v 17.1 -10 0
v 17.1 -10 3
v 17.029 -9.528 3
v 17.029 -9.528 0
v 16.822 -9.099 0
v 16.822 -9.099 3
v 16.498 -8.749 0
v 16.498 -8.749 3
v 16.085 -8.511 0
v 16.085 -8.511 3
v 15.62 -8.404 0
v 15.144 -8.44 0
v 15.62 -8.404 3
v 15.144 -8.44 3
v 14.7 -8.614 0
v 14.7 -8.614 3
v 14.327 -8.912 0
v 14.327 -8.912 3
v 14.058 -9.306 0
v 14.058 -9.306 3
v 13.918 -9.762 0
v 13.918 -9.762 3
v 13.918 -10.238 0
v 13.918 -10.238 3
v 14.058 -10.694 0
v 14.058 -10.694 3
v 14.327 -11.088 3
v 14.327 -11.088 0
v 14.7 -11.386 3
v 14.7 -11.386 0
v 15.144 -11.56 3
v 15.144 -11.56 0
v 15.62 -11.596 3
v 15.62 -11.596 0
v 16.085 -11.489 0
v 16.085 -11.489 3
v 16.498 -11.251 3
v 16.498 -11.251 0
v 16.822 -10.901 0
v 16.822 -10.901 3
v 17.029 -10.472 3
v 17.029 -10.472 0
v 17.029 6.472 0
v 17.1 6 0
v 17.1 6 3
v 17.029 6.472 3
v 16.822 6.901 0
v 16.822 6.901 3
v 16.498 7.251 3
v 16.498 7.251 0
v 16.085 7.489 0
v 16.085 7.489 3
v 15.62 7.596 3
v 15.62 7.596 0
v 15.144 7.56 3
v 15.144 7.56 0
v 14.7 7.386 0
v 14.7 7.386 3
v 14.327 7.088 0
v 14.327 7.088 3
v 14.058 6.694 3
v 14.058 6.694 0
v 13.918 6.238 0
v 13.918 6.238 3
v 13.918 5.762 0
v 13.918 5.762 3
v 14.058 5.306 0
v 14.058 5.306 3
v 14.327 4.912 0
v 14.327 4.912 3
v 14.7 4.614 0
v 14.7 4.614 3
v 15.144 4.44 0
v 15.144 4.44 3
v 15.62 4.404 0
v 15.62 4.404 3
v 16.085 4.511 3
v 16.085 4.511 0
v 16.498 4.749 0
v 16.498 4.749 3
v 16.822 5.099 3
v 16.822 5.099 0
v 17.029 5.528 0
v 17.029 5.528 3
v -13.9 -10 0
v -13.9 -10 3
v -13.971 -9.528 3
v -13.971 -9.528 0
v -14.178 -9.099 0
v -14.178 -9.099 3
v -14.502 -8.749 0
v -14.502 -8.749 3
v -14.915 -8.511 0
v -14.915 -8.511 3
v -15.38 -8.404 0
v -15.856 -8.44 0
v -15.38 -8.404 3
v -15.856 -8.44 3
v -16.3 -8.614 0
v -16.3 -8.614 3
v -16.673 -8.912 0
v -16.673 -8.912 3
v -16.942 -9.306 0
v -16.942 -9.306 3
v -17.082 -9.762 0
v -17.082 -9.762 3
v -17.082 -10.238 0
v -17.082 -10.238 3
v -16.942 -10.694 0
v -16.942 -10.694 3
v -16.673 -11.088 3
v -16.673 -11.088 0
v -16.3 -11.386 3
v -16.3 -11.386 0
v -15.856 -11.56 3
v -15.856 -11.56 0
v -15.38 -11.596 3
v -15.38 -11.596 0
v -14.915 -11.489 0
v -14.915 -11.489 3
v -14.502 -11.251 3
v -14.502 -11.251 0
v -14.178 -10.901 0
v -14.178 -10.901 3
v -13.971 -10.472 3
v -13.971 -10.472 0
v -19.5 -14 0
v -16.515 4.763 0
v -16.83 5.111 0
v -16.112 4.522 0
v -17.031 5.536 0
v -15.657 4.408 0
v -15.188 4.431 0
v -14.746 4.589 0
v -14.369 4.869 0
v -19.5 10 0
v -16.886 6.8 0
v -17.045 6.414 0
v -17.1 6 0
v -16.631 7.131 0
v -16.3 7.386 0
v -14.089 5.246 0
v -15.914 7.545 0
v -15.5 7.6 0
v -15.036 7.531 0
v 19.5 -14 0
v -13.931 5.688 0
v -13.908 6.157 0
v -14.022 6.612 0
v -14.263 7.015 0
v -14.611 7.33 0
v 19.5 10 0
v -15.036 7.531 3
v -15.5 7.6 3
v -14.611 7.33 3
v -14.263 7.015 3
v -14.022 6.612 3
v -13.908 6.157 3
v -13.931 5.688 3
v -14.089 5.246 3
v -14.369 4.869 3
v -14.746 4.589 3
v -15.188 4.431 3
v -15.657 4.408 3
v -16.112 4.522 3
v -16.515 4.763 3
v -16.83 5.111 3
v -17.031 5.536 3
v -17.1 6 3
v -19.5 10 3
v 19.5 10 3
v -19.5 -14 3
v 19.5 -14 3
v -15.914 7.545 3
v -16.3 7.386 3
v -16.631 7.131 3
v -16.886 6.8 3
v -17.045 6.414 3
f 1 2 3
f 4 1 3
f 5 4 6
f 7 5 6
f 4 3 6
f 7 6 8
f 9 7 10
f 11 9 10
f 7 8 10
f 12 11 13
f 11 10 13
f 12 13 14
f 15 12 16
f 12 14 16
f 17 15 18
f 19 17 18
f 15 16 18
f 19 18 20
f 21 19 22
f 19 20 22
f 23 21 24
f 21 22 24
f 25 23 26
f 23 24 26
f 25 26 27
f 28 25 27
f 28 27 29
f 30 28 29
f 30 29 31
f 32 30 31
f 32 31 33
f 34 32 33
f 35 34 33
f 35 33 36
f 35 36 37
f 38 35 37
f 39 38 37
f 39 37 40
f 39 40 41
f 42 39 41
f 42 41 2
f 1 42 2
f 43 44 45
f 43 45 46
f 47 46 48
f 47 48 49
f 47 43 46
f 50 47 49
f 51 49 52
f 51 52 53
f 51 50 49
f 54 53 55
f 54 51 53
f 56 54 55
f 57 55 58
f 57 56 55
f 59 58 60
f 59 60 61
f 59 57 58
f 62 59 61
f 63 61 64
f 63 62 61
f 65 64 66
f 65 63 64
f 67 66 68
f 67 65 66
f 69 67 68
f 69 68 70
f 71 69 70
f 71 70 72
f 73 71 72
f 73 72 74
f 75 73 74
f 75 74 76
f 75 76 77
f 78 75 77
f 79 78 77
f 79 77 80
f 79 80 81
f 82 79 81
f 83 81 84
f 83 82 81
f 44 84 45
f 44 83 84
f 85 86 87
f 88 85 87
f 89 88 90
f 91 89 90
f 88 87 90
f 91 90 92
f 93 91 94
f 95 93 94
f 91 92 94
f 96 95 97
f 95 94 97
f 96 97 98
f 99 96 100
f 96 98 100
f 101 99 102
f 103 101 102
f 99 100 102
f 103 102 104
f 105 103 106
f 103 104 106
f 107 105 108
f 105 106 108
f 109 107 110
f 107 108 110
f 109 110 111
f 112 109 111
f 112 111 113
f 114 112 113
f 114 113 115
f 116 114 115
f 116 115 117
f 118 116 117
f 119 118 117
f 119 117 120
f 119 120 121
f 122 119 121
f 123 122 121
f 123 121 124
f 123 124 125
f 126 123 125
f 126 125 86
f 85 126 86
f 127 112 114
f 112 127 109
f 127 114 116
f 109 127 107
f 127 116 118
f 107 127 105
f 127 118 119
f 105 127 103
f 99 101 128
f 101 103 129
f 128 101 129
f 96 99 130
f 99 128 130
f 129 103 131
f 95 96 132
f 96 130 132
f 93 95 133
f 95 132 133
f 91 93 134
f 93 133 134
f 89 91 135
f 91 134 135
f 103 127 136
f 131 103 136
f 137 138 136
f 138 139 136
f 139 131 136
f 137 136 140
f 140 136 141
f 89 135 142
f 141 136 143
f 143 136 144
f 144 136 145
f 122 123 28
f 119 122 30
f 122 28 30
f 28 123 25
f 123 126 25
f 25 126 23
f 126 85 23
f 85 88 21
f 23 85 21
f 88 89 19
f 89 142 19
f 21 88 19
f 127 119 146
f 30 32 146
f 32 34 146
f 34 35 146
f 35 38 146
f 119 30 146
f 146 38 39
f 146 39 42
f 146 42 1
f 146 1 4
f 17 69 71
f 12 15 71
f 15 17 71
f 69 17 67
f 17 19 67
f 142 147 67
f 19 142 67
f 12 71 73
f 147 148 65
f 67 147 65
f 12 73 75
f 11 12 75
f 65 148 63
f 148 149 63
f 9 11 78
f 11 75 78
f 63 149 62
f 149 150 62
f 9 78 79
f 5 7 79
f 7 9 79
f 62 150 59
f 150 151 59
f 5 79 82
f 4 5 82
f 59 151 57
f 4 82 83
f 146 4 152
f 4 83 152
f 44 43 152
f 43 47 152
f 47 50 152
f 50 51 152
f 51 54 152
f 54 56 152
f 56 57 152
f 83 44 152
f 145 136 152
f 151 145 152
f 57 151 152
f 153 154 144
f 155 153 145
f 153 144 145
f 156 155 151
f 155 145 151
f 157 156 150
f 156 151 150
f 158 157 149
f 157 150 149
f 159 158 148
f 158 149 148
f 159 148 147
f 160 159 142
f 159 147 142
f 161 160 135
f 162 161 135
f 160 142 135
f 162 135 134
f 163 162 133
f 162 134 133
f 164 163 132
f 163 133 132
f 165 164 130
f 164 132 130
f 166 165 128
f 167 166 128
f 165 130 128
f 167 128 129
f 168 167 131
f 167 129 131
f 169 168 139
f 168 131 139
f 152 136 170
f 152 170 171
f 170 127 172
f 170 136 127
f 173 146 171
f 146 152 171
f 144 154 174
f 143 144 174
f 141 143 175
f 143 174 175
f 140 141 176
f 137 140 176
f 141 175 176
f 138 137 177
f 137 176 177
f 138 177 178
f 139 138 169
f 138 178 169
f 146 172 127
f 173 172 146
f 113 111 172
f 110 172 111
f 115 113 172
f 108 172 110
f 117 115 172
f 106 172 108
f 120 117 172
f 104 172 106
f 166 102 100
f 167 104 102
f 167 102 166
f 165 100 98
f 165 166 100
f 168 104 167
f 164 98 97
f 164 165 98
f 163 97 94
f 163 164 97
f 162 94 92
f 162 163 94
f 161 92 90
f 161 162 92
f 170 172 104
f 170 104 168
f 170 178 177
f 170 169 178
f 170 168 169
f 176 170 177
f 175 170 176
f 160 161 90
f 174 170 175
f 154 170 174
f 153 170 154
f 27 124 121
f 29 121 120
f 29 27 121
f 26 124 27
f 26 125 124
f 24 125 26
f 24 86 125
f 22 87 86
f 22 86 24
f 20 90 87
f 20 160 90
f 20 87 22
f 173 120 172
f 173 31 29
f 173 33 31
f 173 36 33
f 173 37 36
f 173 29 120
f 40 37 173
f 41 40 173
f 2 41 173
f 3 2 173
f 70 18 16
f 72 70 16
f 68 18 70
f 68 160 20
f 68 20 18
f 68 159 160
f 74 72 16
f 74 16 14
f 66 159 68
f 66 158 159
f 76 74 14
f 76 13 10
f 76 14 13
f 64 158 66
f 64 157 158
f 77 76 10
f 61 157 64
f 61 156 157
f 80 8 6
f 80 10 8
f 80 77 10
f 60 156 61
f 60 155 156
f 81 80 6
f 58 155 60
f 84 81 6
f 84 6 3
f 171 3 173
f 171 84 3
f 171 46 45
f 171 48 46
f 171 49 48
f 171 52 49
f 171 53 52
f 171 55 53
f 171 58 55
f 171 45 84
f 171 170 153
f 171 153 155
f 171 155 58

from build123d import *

# Parameters (mm, degrees)
SKETCH_1_W          = 39
SKETCH_1_H          = 20
SKETCH_1_R          = 1.6
EXTRUDE_1_DEPTH     = 3
SKETCH_2_W          = 39
SKETCH_2_H          = 3
EXTRUDE_2_DEPTH     = 4
SKETCH_3_R          = 1.6
CUT_EXTRUDE_1_DEPTH = 4


with BuildPart() as part:
    # ｽｹｯﾁ1 → ﾎﾞｽ - 押し出し1 (new body)
    with BuildSketch(Plane.XY):
        Rectangle(SKETCH_1_W, SKETCH_1_H)
        with Locations((15.5, 6)):
            Circle(SKETCH_1_R, mode=Mode.SUBTRACT)
        with BuildLine():
            ThreePointArc((-15.5, 7.6), (-14.36862915, 4.86862915), (-17.1, 6))
            Line((-17.1, 6), (-15.5, 6))
            Line((-15.5, 6), (-15.5, 7.6))
        make_face(mode=Mode.SUBTRACT)
    extrude(amount=EXTRUDE_1_DEPTH)

    # ｽｹｯﾁ2 → ﾎﾞｽ - 押し出し2 (add)
    with BuildSketch(Plane.XZ.offset(10)):
        with Locations((0, 1.5)):
            Rectangle(SKETCH_2_W, SKETCH_2_H)
    extrude(amount=EXTRUDE_2_DEPTH)

    # ｽｹｯﾁ3 → ｶｯﾄ - 押し出し1 (cut)
    with BuildSketch(Plane.XY.offset(3)):
        with Locations((-15.5, 6)):
            Circle(SKETCH_3_R)
        with Locations((-15.5, -10)):
            Circle(SKETCH_3_R)
        with Locations((15.5, -10)):
            Circle(SKETCH_3_R)
    extrude(amount=-CUT_EXTRUDE_1_DEPTH, mode=Mode.SUBTRACT)


solid = part.part
